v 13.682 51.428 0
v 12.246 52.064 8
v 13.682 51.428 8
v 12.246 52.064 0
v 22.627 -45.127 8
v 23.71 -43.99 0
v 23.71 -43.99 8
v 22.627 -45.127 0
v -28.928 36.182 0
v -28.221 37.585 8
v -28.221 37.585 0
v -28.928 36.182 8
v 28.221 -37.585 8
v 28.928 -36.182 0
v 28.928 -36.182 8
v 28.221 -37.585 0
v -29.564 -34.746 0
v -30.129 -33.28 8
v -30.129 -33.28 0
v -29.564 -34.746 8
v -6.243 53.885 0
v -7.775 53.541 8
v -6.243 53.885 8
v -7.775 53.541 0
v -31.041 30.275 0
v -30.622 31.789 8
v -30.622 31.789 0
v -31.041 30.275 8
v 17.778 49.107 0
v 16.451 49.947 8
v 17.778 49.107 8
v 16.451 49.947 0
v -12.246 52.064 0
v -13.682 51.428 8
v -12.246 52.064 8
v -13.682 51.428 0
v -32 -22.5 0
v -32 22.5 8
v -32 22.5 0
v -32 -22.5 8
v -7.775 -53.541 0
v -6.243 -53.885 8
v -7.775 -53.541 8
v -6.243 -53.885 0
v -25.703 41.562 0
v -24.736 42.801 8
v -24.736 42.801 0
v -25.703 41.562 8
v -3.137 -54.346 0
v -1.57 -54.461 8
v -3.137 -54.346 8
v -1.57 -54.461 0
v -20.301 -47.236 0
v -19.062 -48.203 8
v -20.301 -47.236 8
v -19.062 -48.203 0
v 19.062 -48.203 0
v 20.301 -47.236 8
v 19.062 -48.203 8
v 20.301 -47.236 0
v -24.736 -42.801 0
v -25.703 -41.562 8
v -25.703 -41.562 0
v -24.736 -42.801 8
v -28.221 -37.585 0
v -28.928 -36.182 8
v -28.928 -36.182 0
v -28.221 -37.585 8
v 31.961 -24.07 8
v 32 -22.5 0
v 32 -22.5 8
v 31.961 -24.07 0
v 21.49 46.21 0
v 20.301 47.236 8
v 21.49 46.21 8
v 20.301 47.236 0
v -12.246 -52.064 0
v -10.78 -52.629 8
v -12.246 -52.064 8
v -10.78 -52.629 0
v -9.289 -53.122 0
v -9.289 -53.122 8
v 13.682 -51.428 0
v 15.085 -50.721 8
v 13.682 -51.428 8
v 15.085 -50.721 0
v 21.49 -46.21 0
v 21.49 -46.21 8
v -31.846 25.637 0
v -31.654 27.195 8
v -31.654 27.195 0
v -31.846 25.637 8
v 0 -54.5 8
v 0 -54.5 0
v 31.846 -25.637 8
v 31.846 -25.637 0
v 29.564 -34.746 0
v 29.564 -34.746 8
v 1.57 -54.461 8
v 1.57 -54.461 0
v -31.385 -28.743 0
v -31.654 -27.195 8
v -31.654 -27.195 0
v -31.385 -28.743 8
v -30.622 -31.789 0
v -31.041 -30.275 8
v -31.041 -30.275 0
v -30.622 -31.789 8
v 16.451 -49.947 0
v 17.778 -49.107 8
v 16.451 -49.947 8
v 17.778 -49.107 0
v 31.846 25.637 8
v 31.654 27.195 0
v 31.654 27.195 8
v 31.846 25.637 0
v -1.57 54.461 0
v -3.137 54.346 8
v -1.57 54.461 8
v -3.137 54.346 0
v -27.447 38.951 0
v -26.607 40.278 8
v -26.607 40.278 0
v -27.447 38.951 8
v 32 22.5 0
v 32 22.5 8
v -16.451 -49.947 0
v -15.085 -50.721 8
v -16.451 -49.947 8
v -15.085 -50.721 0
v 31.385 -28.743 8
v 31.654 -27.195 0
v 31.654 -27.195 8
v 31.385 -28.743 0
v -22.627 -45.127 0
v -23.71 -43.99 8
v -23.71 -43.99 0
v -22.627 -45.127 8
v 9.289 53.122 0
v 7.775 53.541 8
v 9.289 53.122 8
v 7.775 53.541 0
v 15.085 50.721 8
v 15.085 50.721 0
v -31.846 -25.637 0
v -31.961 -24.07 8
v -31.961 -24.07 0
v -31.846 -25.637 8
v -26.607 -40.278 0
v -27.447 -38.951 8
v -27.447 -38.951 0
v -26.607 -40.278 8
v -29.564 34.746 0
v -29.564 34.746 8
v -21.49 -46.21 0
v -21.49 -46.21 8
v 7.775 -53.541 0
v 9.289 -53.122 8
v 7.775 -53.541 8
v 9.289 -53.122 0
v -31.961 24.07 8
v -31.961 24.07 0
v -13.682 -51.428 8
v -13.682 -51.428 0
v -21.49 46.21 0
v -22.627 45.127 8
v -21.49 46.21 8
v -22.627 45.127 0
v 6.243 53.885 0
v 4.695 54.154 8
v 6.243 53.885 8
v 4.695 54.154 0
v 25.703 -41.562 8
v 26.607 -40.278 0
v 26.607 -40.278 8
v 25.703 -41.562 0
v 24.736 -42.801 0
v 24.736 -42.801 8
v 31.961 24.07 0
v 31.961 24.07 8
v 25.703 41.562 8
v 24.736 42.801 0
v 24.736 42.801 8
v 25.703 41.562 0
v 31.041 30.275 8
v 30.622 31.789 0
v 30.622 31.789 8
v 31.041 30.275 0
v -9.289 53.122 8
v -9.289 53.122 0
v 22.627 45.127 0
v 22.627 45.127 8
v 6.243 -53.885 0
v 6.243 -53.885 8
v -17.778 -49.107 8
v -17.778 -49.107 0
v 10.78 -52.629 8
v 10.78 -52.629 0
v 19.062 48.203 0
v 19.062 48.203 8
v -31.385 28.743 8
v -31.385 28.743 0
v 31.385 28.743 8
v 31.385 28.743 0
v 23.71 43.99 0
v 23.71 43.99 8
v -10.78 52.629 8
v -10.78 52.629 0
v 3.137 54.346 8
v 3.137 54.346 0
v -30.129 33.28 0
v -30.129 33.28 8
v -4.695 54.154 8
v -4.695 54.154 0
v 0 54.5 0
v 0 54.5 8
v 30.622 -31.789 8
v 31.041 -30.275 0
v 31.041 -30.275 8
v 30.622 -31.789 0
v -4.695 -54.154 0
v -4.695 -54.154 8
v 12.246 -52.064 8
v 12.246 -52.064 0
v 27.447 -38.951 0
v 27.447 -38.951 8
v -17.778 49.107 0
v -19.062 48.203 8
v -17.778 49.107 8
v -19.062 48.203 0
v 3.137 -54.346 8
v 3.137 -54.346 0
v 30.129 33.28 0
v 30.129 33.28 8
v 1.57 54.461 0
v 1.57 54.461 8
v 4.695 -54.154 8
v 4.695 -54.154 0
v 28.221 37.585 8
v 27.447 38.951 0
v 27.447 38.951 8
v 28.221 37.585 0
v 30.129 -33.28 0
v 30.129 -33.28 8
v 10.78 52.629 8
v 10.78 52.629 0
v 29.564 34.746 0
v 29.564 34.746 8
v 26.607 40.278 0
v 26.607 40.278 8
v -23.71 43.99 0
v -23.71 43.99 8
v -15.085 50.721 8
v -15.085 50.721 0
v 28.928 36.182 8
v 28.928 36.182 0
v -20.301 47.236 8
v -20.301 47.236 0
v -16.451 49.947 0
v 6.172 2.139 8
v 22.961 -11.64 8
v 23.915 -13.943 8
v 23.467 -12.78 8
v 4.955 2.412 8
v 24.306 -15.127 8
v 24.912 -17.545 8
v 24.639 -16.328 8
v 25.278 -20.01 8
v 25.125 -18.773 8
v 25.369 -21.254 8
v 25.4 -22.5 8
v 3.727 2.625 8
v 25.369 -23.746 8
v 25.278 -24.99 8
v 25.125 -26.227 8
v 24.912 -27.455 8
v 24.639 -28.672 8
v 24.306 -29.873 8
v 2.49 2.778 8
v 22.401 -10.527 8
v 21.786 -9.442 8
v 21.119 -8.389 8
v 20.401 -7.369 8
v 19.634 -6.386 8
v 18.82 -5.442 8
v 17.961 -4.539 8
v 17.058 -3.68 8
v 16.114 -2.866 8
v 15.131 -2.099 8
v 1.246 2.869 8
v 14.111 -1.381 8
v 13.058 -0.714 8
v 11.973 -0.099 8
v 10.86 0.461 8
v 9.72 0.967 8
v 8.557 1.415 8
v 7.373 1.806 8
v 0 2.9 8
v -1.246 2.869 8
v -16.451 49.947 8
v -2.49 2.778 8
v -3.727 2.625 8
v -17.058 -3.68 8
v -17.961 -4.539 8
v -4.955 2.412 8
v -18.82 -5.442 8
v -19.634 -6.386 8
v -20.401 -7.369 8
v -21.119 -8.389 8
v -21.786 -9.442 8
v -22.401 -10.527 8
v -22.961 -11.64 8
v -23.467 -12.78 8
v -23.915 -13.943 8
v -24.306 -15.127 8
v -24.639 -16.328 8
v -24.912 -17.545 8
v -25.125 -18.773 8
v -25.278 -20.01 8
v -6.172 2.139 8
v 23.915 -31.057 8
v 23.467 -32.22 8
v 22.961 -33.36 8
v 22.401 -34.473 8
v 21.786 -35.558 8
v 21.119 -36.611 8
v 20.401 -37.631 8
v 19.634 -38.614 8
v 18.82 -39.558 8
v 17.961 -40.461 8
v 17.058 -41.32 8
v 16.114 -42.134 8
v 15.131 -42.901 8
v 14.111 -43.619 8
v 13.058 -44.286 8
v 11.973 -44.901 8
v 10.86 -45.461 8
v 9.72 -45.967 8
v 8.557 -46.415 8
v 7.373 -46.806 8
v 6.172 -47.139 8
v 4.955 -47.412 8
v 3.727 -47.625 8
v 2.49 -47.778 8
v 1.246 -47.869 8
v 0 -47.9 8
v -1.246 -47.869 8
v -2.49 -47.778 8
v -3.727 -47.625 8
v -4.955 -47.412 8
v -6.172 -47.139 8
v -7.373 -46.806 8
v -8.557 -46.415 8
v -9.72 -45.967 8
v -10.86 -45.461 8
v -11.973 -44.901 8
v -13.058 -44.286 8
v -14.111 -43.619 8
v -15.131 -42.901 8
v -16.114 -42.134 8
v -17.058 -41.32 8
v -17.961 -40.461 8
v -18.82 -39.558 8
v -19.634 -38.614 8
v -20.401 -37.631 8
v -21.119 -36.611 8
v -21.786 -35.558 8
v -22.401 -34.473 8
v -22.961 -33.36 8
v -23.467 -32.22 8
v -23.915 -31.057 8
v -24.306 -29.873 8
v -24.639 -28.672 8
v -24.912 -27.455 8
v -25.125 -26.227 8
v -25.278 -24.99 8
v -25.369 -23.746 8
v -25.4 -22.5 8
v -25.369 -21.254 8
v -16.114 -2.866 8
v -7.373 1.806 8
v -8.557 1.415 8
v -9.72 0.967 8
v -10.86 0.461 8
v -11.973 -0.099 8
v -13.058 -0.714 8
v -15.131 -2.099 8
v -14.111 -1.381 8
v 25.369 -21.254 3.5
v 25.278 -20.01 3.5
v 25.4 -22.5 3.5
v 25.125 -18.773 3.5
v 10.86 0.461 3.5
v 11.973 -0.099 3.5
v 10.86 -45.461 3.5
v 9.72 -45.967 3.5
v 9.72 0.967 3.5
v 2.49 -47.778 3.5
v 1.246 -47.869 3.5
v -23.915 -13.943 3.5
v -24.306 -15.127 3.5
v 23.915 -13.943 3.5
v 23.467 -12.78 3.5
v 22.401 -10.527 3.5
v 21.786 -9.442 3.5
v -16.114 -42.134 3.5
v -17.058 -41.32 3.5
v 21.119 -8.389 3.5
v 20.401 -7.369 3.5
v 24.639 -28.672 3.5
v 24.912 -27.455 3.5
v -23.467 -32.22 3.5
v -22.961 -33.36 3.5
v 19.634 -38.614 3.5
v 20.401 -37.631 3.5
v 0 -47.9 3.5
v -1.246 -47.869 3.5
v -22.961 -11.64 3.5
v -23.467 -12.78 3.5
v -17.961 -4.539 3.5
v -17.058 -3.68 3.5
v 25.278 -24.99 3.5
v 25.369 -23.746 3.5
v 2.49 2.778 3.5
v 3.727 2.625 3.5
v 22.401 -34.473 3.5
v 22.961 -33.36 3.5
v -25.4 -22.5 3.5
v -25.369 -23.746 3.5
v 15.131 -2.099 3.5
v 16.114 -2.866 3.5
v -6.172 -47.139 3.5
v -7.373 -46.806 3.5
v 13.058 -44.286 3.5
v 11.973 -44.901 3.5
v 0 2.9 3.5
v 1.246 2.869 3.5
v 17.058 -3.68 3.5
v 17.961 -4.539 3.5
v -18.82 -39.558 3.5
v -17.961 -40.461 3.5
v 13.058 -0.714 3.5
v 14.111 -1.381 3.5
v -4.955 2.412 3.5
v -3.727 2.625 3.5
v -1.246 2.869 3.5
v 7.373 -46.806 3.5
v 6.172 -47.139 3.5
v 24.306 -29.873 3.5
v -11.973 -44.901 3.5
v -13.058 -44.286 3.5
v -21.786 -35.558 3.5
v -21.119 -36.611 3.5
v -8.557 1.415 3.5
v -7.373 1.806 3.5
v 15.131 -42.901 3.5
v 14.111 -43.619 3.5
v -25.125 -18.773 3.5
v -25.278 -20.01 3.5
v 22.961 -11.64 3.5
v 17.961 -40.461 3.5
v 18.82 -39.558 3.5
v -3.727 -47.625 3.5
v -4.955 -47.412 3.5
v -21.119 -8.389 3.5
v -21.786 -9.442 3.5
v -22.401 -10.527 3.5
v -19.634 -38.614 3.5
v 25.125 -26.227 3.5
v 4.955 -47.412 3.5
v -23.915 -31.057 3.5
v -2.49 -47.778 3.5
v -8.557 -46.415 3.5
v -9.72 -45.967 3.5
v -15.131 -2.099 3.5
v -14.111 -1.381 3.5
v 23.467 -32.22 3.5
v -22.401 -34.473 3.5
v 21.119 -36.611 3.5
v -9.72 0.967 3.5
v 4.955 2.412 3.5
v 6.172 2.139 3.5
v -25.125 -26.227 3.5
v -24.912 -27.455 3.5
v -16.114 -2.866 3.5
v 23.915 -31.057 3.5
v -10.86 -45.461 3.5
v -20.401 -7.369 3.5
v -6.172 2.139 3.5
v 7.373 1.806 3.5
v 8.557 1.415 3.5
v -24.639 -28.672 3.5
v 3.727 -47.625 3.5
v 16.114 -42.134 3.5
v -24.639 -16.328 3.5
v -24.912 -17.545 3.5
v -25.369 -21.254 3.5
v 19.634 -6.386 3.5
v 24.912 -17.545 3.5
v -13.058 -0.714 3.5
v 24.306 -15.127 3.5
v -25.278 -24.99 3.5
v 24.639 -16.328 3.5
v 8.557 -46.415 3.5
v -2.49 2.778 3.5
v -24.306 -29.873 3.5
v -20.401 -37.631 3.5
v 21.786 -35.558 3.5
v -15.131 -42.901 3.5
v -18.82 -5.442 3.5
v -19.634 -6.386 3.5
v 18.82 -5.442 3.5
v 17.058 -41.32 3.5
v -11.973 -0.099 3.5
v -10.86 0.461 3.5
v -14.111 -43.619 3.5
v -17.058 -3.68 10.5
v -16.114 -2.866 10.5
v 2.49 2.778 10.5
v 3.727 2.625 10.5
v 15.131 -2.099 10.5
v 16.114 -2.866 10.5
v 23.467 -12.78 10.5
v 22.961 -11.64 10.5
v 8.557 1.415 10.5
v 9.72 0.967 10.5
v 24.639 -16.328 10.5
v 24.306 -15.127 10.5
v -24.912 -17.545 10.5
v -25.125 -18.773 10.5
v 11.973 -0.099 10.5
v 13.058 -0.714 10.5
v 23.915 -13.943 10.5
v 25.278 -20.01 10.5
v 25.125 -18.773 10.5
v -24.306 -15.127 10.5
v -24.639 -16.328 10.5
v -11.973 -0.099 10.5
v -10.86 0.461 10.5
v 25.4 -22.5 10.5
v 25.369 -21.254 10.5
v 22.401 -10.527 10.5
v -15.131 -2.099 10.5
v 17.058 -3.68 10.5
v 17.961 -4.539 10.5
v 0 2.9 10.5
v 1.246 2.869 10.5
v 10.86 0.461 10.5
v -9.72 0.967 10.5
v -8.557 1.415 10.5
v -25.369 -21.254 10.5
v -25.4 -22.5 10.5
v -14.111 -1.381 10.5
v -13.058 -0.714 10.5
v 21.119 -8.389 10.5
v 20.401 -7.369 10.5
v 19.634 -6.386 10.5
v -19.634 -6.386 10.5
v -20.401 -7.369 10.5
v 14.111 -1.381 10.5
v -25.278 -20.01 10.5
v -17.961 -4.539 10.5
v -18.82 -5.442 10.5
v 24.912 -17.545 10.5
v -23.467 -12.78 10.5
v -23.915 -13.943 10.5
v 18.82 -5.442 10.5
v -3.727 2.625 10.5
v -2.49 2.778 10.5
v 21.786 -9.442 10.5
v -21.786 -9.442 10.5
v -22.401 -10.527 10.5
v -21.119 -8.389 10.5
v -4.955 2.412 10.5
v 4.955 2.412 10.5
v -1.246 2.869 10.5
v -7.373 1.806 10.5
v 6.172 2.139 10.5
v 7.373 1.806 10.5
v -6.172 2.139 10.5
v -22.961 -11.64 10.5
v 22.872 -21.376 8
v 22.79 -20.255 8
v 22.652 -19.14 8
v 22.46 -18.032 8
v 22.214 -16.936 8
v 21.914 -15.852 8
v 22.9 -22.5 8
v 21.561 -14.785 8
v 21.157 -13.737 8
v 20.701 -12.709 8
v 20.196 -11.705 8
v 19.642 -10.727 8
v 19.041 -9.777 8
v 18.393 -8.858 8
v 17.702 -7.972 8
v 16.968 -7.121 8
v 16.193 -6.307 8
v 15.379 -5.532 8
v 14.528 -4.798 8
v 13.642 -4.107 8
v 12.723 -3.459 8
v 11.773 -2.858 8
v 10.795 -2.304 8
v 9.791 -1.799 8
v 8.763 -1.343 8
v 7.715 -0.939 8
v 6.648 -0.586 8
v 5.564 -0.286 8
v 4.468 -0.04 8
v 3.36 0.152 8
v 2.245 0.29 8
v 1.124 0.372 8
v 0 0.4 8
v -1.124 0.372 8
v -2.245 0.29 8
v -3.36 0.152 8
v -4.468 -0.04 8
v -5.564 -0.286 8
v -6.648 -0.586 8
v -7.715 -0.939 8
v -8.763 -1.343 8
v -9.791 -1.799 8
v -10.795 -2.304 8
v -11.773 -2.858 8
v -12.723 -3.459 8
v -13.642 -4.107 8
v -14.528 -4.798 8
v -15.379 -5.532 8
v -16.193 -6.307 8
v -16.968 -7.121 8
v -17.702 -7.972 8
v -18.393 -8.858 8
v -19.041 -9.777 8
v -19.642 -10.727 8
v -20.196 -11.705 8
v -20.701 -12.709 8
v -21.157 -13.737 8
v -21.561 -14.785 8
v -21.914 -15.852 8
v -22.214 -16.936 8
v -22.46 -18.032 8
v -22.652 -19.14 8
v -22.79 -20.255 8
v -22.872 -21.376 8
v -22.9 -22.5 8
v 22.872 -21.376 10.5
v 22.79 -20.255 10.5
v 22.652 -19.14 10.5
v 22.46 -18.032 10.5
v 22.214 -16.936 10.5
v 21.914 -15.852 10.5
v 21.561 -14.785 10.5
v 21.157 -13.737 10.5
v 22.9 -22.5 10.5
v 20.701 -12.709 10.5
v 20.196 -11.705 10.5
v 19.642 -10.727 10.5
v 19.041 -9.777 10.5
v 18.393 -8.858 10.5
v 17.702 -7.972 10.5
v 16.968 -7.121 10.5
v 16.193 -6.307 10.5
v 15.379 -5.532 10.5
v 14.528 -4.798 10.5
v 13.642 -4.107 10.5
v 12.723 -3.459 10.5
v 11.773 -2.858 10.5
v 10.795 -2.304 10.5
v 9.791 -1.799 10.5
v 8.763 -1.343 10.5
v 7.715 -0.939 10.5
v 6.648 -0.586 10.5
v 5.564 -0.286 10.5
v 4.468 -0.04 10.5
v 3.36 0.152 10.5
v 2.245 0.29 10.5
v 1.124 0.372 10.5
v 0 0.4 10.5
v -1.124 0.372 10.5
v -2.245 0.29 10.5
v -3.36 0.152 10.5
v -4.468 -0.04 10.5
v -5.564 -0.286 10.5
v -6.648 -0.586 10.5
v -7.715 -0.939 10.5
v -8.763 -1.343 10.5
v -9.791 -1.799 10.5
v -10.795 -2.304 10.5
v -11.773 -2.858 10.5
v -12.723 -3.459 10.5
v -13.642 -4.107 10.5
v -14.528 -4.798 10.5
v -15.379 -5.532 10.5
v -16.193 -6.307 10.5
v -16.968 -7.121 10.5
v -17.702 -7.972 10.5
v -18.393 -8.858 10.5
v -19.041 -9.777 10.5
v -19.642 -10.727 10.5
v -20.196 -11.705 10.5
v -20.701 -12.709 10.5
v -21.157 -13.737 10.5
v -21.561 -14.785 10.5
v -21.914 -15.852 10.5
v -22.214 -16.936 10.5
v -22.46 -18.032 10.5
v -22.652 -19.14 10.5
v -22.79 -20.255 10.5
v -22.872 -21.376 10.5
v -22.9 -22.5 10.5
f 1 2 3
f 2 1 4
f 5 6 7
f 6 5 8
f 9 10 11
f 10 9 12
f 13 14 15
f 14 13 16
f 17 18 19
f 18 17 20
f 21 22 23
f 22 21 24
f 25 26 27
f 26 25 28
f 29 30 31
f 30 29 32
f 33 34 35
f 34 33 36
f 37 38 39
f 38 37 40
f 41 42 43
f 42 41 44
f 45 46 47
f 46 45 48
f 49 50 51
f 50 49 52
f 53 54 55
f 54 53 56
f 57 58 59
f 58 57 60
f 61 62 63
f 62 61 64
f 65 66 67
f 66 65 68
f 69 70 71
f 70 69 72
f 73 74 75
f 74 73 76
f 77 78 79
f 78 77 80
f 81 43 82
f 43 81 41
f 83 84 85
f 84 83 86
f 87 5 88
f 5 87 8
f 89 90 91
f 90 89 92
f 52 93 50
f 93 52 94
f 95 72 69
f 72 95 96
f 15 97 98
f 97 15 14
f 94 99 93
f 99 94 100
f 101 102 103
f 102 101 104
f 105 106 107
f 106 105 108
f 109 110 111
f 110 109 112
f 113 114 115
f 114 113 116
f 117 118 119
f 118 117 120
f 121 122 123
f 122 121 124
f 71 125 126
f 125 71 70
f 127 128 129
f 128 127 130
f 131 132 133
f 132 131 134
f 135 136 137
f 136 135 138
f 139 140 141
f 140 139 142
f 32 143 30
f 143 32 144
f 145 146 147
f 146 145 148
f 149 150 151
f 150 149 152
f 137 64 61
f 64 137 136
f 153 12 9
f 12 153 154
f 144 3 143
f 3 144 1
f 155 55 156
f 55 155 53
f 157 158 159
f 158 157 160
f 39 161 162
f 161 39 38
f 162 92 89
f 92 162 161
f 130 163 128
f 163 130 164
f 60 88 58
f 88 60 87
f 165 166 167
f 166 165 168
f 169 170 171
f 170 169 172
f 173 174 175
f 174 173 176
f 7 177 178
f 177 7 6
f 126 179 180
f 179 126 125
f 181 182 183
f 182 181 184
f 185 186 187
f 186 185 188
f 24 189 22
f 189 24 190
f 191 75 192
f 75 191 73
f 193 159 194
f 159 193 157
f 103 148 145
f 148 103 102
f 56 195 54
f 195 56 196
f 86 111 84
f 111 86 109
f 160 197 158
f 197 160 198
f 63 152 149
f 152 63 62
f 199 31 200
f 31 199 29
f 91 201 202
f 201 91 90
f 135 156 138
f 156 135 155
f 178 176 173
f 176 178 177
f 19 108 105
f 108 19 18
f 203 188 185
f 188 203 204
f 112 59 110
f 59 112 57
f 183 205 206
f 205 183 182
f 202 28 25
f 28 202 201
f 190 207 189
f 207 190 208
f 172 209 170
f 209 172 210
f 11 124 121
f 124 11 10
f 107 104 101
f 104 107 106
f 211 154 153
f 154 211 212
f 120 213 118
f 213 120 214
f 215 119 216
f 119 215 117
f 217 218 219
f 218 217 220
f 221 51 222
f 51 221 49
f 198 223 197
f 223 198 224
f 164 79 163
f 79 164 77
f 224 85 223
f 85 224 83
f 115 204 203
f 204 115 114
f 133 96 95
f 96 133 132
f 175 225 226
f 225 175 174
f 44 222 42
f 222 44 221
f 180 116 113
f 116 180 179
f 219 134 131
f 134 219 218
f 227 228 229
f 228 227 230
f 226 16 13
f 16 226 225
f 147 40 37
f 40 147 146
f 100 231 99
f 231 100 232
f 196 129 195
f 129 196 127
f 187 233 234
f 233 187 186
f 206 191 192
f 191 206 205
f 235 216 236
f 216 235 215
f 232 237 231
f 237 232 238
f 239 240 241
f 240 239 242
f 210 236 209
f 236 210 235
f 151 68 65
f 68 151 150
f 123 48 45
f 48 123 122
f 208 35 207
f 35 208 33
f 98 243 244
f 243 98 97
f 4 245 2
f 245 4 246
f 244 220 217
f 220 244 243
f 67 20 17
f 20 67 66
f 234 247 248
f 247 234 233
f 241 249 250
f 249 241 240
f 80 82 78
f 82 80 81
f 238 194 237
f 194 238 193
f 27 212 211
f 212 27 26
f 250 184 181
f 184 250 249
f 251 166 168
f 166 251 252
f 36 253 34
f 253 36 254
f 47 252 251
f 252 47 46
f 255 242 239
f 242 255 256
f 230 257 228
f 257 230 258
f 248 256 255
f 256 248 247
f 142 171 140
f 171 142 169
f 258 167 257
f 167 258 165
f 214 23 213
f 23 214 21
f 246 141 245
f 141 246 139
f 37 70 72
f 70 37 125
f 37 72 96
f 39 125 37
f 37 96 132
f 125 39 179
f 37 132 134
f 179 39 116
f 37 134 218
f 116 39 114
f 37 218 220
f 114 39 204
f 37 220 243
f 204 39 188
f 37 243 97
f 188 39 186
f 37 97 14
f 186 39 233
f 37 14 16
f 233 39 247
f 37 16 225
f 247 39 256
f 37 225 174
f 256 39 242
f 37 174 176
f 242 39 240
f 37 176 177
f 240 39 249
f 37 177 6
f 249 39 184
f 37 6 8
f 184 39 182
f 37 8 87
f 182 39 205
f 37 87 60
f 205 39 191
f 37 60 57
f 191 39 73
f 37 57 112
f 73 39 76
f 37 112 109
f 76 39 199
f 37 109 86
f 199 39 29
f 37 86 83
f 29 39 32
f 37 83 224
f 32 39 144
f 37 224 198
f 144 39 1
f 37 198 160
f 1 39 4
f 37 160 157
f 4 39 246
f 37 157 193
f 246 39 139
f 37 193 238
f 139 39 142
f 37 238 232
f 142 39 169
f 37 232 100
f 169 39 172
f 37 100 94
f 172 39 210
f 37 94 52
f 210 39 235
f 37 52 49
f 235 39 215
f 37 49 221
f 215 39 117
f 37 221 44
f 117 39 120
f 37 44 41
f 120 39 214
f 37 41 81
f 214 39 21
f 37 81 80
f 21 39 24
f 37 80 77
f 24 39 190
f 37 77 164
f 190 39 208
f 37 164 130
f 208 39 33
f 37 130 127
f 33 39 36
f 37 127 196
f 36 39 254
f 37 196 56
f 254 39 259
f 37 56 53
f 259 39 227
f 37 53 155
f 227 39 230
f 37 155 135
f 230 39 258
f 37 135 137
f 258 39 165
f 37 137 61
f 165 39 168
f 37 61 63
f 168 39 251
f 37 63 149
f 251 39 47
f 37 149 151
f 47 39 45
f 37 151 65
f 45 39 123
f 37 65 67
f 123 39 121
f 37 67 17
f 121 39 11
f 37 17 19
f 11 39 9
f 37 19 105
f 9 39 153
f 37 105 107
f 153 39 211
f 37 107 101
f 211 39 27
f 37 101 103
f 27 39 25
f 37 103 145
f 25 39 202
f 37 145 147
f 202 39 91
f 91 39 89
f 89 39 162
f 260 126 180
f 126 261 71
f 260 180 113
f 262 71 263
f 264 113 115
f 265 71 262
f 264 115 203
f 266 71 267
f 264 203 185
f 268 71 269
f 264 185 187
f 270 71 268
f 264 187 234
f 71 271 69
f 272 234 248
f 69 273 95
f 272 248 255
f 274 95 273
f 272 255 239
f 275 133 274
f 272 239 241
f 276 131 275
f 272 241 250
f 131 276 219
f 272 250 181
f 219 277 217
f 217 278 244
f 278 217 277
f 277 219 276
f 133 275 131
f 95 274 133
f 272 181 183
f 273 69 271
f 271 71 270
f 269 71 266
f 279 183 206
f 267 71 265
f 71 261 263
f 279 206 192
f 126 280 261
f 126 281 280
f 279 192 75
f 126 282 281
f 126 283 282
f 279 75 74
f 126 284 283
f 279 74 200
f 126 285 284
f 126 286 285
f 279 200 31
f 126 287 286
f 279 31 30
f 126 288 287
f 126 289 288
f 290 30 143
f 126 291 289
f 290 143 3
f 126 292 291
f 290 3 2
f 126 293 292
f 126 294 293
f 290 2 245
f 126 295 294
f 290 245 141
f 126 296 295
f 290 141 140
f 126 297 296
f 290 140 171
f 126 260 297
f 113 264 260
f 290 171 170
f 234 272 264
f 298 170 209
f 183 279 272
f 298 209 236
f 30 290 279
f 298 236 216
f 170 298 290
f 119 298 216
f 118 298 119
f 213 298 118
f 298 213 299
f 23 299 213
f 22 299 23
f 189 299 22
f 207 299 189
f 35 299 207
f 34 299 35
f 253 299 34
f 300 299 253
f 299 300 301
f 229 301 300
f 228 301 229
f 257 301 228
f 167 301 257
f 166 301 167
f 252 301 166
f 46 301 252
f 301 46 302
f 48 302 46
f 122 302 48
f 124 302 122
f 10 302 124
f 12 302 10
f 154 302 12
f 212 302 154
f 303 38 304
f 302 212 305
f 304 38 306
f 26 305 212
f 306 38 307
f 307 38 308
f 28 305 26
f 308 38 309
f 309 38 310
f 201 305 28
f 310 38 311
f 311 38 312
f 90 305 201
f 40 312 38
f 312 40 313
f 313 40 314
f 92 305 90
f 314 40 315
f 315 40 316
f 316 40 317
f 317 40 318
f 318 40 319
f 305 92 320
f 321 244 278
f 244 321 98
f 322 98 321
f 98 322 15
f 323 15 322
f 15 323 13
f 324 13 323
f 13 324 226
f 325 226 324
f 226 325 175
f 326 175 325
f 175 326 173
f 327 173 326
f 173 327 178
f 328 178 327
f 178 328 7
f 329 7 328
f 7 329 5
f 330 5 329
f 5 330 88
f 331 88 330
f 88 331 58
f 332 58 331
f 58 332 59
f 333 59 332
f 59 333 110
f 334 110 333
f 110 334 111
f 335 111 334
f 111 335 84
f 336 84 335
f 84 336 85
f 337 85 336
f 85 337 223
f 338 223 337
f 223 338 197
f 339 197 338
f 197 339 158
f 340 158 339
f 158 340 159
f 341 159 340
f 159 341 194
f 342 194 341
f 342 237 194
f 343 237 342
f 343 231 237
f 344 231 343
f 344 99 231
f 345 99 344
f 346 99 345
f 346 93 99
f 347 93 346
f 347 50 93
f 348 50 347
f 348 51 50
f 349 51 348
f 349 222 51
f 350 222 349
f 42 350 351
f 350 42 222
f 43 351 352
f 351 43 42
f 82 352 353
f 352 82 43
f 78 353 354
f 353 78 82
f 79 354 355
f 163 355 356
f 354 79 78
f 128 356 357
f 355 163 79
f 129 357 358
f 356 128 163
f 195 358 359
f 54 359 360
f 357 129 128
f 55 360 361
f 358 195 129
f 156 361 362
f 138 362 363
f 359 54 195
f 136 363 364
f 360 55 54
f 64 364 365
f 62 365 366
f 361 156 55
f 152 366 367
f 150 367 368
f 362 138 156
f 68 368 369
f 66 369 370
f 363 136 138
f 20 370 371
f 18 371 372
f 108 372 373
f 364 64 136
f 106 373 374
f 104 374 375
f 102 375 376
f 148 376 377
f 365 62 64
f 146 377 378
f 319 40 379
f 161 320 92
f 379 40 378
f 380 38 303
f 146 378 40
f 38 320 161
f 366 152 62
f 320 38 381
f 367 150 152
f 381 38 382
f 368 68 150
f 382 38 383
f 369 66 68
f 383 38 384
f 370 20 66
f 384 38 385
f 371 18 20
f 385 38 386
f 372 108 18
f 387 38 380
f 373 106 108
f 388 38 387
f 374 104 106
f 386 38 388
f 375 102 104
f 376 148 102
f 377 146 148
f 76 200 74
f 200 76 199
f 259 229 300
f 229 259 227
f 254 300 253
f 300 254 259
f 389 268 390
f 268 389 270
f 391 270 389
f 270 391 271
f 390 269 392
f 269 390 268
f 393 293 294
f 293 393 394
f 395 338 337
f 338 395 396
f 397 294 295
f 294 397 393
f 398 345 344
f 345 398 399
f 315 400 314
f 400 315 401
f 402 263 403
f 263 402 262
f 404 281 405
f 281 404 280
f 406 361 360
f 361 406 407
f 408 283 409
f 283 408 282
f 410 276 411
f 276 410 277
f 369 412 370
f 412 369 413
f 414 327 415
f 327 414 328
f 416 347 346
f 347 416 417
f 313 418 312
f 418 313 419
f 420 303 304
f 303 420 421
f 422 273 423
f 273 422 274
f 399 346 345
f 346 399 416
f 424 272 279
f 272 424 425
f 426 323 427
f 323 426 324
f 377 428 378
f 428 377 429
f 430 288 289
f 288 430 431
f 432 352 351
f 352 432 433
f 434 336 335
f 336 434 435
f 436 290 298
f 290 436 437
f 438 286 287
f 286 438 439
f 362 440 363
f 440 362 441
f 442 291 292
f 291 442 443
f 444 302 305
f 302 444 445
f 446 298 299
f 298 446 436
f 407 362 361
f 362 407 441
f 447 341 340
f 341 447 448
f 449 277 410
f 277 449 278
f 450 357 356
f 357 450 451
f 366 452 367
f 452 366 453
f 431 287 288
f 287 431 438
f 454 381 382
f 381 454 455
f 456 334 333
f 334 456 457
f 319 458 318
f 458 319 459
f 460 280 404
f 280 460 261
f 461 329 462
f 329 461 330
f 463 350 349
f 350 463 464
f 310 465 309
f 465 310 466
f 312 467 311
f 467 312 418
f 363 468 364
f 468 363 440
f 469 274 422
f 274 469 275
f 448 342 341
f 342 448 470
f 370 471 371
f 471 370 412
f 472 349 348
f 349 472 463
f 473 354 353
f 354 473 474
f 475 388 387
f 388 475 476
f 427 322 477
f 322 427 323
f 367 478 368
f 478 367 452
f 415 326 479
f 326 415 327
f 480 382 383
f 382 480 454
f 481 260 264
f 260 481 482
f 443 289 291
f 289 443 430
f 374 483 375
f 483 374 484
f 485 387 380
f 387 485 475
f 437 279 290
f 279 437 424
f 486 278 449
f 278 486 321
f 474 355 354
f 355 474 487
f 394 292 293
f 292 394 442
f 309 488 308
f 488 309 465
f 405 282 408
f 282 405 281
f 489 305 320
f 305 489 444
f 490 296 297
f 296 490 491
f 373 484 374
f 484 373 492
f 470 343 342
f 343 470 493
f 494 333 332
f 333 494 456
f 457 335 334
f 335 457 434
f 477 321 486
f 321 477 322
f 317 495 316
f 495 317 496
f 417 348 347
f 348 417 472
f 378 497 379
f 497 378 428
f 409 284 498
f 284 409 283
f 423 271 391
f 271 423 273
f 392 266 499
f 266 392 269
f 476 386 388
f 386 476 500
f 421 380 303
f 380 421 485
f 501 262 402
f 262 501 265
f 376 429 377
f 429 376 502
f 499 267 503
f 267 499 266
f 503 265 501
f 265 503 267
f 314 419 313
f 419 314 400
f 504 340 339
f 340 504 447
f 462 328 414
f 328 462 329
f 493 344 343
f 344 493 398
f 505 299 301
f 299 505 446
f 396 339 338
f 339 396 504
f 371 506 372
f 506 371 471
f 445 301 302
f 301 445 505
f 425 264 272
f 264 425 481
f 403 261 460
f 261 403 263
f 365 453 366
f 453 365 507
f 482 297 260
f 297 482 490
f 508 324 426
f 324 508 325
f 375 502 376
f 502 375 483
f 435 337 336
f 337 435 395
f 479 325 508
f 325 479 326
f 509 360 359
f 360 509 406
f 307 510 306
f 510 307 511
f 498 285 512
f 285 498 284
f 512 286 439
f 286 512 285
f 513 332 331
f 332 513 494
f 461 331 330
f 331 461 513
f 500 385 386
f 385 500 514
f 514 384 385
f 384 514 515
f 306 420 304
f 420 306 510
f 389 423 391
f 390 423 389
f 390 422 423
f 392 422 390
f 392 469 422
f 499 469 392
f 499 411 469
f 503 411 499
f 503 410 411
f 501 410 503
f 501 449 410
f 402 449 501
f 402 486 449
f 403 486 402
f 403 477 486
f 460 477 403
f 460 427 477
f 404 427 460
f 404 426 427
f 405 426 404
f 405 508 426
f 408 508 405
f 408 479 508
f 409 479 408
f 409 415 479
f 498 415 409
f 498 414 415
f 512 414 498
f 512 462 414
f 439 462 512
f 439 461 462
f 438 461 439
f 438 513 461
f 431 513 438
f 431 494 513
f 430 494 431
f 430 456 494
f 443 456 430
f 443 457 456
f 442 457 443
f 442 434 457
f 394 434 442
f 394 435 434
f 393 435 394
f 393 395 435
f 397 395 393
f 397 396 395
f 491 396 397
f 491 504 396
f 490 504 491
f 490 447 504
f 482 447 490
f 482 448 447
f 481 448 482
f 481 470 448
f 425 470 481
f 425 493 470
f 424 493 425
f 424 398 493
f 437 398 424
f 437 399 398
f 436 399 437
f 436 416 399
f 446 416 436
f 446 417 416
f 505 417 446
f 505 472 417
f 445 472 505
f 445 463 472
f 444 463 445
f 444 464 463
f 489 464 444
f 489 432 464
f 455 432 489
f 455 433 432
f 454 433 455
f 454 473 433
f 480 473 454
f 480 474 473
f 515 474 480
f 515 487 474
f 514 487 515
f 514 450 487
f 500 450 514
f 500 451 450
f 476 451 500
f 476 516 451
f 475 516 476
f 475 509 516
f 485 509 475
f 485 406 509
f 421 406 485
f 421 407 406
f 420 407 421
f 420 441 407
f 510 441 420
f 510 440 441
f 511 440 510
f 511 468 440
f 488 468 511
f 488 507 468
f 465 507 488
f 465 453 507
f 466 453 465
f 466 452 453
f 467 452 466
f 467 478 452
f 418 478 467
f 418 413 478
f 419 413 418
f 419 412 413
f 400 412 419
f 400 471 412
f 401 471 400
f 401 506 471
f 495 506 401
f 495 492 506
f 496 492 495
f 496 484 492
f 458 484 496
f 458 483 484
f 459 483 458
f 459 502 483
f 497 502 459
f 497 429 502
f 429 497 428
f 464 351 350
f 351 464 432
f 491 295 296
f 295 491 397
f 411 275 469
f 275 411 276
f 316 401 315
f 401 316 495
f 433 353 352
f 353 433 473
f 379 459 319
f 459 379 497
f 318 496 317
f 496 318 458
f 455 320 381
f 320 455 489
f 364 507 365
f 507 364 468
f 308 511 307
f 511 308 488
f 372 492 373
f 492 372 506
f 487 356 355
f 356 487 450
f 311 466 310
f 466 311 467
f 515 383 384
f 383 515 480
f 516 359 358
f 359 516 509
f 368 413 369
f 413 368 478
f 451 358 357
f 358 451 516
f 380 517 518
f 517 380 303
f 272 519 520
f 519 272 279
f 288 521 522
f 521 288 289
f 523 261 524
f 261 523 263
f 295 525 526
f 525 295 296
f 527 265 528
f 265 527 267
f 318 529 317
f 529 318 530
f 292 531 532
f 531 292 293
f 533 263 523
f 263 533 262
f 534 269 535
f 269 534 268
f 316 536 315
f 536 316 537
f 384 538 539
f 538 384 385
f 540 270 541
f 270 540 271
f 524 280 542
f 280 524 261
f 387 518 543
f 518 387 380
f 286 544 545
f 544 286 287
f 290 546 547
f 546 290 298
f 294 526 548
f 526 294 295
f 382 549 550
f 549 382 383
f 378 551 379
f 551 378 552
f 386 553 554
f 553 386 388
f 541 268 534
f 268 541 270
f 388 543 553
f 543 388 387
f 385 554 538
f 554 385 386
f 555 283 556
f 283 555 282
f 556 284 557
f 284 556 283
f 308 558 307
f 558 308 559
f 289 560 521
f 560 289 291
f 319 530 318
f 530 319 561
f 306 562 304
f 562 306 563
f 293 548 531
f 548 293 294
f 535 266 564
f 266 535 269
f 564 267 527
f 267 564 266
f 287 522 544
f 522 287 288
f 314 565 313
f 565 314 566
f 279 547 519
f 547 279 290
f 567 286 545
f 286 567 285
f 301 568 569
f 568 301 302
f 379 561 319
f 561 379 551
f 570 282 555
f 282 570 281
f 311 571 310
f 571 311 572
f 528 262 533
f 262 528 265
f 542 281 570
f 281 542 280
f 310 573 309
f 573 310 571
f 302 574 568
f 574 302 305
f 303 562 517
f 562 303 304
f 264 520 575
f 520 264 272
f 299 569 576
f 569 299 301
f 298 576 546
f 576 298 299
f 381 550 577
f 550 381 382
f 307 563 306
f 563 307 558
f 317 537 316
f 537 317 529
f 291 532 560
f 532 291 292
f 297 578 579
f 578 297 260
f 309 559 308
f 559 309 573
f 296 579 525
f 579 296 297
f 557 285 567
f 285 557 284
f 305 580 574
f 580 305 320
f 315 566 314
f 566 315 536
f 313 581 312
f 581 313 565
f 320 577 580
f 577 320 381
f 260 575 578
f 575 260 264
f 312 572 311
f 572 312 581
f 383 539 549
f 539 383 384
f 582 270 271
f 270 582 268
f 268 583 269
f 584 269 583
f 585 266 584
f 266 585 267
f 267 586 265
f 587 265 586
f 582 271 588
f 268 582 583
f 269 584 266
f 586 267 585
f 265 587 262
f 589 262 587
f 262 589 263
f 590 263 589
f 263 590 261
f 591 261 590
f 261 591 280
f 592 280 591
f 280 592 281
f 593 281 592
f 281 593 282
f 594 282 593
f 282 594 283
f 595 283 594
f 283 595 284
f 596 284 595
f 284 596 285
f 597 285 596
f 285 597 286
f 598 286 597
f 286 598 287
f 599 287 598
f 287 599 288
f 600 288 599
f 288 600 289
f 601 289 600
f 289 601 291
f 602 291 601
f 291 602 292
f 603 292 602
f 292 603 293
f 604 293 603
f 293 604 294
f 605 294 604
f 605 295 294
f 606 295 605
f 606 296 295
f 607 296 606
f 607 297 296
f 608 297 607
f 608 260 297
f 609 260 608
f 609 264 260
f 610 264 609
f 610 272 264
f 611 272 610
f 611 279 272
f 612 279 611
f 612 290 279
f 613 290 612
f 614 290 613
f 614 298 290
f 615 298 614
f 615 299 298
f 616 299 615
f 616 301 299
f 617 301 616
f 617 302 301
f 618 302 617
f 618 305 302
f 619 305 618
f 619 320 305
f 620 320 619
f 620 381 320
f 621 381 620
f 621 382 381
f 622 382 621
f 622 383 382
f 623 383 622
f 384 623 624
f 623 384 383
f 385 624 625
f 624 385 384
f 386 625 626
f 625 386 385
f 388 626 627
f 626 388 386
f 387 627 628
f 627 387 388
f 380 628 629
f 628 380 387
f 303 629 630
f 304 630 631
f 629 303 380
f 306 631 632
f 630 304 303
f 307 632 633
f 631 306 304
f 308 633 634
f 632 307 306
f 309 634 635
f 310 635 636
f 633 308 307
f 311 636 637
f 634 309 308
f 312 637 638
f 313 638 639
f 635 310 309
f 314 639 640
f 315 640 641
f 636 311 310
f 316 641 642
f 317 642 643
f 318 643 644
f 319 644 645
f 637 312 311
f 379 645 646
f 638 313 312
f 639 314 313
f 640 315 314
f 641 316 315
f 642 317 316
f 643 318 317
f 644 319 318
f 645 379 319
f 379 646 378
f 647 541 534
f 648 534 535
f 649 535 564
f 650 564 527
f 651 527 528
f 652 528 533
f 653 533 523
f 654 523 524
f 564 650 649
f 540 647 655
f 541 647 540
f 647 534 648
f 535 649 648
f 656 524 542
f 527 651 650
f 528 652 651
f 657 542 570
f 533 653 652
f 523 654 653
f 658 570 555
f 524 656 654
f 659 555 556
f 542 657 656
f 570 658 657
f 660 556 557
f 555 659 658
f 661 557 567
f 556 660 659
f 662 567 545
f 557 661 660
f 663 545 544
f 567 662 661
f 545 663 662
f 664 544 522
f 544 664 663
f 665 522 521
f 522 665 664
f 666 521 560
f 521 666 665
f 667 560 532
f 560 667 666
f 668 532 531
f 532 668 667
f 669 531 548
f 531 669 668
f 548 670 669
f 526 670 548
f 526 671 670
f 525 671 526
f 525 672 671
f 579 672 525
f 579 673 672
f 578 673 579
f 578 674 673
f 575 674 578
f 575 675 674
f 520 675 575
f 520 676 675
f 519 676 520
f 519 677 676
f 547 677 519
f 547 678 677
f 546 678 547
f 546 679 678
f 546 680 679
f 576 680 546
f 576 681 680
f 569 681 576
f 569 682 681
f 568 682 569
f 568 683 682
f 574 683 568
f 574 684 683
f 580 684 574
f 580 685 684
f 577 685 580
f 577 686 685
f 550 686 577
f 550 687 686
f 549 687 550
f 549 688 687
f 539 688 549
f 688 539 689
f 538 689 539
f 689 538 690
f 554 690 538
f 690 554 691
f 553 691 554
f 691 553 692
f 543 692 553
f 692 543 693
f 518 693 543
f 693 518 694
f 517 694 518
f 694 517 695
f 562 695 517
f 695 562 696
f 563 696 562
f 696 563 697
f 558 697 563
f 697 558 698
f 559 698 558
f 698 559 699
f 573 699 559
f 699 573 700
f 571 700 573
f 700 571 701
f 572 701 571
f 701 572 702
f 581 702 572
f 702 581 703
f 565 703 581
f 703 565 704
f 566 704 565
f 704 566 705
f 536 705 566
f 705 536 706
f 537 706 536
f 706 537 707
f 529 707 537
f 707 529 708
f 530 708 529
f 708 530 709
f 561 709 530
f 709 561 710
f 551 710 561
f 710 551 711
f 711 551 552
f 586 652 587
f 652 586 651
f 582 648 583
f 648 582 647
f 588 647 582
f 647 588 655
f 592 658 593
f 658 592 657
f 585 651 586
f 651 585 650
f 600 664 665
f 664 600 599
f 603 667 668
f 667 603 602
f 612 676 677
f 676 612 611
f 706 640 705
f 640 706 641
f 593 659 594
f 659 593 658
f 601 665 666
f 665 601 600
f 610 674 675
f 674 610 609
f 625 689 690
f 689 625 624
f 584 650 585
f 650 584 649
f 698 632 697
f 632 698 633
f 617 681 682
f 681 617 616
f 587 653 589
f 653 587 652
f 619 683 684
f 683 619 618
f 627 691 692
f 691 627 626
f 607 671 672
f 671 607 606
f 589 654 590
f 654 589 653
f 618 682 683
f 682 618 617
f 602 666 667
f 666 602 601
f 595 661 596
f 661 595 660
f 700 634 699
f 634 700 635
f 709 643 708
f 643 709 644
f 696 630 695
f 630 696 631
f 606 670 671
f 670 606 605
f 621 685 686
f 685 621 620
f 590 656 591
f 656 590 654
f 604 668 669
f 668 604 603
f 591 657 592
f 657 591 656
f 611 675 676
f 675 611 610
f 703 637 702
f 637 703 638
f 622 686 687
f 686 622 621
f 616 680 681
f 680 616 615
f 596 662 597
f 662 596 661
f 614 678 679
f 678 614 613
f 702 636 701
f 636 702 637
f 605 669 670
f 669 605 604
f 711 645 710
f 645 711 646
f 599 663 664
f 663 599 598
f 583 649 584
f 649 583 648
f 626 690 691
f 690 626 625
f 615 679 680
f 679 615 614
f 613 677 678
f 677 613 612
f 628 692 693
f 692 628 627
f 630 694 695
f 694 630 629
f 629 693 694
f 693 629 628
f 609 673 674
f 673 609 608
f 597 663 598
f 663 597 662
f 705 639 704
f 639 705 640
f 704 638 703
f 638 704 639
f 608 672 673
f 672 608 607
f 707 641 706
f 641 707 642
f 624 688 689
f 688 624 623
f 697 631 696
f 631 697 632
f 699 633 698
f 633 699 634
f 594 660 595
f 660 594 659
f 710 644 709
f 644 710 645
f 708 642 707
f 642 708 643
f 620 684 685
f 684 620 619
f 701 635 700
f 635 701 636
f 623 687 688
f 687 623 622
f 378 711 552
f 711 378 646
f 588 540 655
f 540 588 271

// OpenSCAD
// ==========================================
// Bathroom Hook Holder - Adapter Base Plate
// ==========================================
//
// Problem:  small adhesive area → hook detaches from tile
// Solution: large stadium-shaped base plate with:
//           - circular pocket  → locates the hook disc (no glue)
//           - retention lip    → holds disc against peel force
//                                without any adhesive on the disc
//
// Orientation: Y = up/down, X = left/right, Z = thickness (into wall)
// Pocket at BOTTOM of stadium → adhesive above has maximum lever arm
//
// Print: flat on bed, pocket opening facing up (Z+)
// Mount: flat back glued to tile
// Disc insertion: tilt disc (bottom edge in first), rotate flat –
//                 top edge slides under the lip and is retained
// Disc removal:   push up on bottom edge to tilt out
// ==========================================

/* [Hook disc] */
disc_d = 50;   // Disc diameter [mm]
disc_h = 6;    // Disc thickness [mm] (informational – disc will protrude ~1.5 mm)

/* [Base plate shape] */
base_r     = 32;   // Semicircle radius [mm]  (must be >= disc_d/2 + pocket_wall)
base_len   = 45;   // Straight section length between semicircle centres [mm]
base_thick = 3.5;  // Back wall thickness (against tile) [mm]

/* [Locating pocket] */
pocket_clr  = 0.4;  // Pocket clearance – disc slides in freely [mm]
pocket_dep  = 4.5;  // Pocket depth [mm]  (disc protrudes = disc_h - pocket_dep)
pocket_wall = 5.0;  // Min. wall thickness around pocket [mm] (reference only)

/* [Retention lip] */
// The lip is a half-ring that protrudes FORWARD from the adapter face (in +Z).
// It covers the upper arc (~180°) of the disc opening, physically overlapping
// the top edge of the disc ("pastylka").  The disc cannot pull straight out
// because the upper edge is blocked by the lip.
//
// Disc insertion: tilt disc (bottom edge in first, the pocket is open below),
//                 rotate flat – top edge slides under the lip.
// Disc removal:   push bottom edge in to tilt disc, top edge pops out.
//
// Key constraint: lip_protrude MUST be greater than disc protrusion
//   (= disc_h - pocket_dep) so the lip actually covers the disc edge.
//   Default: disc protrudes 1.5 mm, lip protrudes 2.5 mm → 1 mm of overlap.
lip_w        = 2.5;   // Radial overhang inward from pocket wall [mm]
                      //   = how much disc edge is caught laterally. Try 2–3.5 mm.
lip_protrude = 2.5;   // How far lip sticks out from adapter front face [mm]
                      //   Must be > (disc_h - pocket_dep). Try 2.0–3.5 mm.

/* [Render] */
$fn = 128;

// === Derived ===
pocket_d    = disc_d + 2 * pocket_clr;
total_thick = base_thick + pocket_dep;
pocket_y    = -base_len / 2;   // centre of bottom semicircle

_wall       = base_r - pocket_d / 2;
_disc_prot  = disc_h - pocket_dep;       // how much disc sticks out from adapter face
_lip_overlap = lip_protrude - _disc_prot; // how much lip covers disc from the front
echo(str("Overall: ", 2*base_r, " x ", 2*base_r+base_len, " x ", total_thick, " mm"));
echo(str("Pocket dia: ", pocket_d, " mm  |  wall: ", _wall, " mm"));
echo(str("Disc protrusion: ", _disc_prot, " mm  |  Lip protrusion: ", lip_protrude, " mm  |  Axial overlap: ", _lip_overlap, " mm"));
echo(str("Lip inner dia: ", pocket_d - 2*lip_w, " mm  (disc: ", disc_d, " → radial capture: ", lip_w - pocket_clr, " mm/side)"));

// === Modules ===

// Stadium body – vertical orientation (long axis = Y)
module stadium(r, len, h) {
    hull() {
        translate([0,  len/2, 0]) cylinder(r=r, h=h);
        translate([0, -len/2, 0]) cylinder(r=r, h=h);
    }
}

// Cylindrical locating pocket – plain hole, no snap-fit
module pocket() {
    translate([0, pocket_y, base_thick])
        cylinder(d=pocket_d, h=pocket_dep + 0.01);
}

// Retention lip – upper half-ring protruding from the FRONT FACE of the adapter.
// Sits at Z = total_thick (front face) and extends to Z = total_thick + lip_protrude.
// Covers the upper 180° arc of the pocket opening.
// Visually: a half-pipe awning overhanging the top of the disc opening.
// Functionally: the disc's top edge cannot move in +Z (out from wall) because
//               the lip is physically in the way.
module retention_lip() {
    translate([0, pocket_y, total_thick]) {
        intersection() {
            // Half-ring: outer edge at pocket wall, inner edge lip_w inward
            difference() {
                cylinder(d=pocket_d,           h=lip_protrude);
                cylinder(d=pocket_d - 2*lip_w, h=lip_protrude + 0.01);
            }
            // Mask: upper half only (local Y ≥ 0 = high-Y side of disc)
            translate([-pocket_d, 0, -0.01])
                cube([2*pocket_d, pocket_d, lip_protrude + 0.02]);
        }
    }
}

// === Assembly ===
union() {
    difference() {
        stadium(base_r, base_len, total_thick);
        pocket();
    }
    retention_lip();
}
